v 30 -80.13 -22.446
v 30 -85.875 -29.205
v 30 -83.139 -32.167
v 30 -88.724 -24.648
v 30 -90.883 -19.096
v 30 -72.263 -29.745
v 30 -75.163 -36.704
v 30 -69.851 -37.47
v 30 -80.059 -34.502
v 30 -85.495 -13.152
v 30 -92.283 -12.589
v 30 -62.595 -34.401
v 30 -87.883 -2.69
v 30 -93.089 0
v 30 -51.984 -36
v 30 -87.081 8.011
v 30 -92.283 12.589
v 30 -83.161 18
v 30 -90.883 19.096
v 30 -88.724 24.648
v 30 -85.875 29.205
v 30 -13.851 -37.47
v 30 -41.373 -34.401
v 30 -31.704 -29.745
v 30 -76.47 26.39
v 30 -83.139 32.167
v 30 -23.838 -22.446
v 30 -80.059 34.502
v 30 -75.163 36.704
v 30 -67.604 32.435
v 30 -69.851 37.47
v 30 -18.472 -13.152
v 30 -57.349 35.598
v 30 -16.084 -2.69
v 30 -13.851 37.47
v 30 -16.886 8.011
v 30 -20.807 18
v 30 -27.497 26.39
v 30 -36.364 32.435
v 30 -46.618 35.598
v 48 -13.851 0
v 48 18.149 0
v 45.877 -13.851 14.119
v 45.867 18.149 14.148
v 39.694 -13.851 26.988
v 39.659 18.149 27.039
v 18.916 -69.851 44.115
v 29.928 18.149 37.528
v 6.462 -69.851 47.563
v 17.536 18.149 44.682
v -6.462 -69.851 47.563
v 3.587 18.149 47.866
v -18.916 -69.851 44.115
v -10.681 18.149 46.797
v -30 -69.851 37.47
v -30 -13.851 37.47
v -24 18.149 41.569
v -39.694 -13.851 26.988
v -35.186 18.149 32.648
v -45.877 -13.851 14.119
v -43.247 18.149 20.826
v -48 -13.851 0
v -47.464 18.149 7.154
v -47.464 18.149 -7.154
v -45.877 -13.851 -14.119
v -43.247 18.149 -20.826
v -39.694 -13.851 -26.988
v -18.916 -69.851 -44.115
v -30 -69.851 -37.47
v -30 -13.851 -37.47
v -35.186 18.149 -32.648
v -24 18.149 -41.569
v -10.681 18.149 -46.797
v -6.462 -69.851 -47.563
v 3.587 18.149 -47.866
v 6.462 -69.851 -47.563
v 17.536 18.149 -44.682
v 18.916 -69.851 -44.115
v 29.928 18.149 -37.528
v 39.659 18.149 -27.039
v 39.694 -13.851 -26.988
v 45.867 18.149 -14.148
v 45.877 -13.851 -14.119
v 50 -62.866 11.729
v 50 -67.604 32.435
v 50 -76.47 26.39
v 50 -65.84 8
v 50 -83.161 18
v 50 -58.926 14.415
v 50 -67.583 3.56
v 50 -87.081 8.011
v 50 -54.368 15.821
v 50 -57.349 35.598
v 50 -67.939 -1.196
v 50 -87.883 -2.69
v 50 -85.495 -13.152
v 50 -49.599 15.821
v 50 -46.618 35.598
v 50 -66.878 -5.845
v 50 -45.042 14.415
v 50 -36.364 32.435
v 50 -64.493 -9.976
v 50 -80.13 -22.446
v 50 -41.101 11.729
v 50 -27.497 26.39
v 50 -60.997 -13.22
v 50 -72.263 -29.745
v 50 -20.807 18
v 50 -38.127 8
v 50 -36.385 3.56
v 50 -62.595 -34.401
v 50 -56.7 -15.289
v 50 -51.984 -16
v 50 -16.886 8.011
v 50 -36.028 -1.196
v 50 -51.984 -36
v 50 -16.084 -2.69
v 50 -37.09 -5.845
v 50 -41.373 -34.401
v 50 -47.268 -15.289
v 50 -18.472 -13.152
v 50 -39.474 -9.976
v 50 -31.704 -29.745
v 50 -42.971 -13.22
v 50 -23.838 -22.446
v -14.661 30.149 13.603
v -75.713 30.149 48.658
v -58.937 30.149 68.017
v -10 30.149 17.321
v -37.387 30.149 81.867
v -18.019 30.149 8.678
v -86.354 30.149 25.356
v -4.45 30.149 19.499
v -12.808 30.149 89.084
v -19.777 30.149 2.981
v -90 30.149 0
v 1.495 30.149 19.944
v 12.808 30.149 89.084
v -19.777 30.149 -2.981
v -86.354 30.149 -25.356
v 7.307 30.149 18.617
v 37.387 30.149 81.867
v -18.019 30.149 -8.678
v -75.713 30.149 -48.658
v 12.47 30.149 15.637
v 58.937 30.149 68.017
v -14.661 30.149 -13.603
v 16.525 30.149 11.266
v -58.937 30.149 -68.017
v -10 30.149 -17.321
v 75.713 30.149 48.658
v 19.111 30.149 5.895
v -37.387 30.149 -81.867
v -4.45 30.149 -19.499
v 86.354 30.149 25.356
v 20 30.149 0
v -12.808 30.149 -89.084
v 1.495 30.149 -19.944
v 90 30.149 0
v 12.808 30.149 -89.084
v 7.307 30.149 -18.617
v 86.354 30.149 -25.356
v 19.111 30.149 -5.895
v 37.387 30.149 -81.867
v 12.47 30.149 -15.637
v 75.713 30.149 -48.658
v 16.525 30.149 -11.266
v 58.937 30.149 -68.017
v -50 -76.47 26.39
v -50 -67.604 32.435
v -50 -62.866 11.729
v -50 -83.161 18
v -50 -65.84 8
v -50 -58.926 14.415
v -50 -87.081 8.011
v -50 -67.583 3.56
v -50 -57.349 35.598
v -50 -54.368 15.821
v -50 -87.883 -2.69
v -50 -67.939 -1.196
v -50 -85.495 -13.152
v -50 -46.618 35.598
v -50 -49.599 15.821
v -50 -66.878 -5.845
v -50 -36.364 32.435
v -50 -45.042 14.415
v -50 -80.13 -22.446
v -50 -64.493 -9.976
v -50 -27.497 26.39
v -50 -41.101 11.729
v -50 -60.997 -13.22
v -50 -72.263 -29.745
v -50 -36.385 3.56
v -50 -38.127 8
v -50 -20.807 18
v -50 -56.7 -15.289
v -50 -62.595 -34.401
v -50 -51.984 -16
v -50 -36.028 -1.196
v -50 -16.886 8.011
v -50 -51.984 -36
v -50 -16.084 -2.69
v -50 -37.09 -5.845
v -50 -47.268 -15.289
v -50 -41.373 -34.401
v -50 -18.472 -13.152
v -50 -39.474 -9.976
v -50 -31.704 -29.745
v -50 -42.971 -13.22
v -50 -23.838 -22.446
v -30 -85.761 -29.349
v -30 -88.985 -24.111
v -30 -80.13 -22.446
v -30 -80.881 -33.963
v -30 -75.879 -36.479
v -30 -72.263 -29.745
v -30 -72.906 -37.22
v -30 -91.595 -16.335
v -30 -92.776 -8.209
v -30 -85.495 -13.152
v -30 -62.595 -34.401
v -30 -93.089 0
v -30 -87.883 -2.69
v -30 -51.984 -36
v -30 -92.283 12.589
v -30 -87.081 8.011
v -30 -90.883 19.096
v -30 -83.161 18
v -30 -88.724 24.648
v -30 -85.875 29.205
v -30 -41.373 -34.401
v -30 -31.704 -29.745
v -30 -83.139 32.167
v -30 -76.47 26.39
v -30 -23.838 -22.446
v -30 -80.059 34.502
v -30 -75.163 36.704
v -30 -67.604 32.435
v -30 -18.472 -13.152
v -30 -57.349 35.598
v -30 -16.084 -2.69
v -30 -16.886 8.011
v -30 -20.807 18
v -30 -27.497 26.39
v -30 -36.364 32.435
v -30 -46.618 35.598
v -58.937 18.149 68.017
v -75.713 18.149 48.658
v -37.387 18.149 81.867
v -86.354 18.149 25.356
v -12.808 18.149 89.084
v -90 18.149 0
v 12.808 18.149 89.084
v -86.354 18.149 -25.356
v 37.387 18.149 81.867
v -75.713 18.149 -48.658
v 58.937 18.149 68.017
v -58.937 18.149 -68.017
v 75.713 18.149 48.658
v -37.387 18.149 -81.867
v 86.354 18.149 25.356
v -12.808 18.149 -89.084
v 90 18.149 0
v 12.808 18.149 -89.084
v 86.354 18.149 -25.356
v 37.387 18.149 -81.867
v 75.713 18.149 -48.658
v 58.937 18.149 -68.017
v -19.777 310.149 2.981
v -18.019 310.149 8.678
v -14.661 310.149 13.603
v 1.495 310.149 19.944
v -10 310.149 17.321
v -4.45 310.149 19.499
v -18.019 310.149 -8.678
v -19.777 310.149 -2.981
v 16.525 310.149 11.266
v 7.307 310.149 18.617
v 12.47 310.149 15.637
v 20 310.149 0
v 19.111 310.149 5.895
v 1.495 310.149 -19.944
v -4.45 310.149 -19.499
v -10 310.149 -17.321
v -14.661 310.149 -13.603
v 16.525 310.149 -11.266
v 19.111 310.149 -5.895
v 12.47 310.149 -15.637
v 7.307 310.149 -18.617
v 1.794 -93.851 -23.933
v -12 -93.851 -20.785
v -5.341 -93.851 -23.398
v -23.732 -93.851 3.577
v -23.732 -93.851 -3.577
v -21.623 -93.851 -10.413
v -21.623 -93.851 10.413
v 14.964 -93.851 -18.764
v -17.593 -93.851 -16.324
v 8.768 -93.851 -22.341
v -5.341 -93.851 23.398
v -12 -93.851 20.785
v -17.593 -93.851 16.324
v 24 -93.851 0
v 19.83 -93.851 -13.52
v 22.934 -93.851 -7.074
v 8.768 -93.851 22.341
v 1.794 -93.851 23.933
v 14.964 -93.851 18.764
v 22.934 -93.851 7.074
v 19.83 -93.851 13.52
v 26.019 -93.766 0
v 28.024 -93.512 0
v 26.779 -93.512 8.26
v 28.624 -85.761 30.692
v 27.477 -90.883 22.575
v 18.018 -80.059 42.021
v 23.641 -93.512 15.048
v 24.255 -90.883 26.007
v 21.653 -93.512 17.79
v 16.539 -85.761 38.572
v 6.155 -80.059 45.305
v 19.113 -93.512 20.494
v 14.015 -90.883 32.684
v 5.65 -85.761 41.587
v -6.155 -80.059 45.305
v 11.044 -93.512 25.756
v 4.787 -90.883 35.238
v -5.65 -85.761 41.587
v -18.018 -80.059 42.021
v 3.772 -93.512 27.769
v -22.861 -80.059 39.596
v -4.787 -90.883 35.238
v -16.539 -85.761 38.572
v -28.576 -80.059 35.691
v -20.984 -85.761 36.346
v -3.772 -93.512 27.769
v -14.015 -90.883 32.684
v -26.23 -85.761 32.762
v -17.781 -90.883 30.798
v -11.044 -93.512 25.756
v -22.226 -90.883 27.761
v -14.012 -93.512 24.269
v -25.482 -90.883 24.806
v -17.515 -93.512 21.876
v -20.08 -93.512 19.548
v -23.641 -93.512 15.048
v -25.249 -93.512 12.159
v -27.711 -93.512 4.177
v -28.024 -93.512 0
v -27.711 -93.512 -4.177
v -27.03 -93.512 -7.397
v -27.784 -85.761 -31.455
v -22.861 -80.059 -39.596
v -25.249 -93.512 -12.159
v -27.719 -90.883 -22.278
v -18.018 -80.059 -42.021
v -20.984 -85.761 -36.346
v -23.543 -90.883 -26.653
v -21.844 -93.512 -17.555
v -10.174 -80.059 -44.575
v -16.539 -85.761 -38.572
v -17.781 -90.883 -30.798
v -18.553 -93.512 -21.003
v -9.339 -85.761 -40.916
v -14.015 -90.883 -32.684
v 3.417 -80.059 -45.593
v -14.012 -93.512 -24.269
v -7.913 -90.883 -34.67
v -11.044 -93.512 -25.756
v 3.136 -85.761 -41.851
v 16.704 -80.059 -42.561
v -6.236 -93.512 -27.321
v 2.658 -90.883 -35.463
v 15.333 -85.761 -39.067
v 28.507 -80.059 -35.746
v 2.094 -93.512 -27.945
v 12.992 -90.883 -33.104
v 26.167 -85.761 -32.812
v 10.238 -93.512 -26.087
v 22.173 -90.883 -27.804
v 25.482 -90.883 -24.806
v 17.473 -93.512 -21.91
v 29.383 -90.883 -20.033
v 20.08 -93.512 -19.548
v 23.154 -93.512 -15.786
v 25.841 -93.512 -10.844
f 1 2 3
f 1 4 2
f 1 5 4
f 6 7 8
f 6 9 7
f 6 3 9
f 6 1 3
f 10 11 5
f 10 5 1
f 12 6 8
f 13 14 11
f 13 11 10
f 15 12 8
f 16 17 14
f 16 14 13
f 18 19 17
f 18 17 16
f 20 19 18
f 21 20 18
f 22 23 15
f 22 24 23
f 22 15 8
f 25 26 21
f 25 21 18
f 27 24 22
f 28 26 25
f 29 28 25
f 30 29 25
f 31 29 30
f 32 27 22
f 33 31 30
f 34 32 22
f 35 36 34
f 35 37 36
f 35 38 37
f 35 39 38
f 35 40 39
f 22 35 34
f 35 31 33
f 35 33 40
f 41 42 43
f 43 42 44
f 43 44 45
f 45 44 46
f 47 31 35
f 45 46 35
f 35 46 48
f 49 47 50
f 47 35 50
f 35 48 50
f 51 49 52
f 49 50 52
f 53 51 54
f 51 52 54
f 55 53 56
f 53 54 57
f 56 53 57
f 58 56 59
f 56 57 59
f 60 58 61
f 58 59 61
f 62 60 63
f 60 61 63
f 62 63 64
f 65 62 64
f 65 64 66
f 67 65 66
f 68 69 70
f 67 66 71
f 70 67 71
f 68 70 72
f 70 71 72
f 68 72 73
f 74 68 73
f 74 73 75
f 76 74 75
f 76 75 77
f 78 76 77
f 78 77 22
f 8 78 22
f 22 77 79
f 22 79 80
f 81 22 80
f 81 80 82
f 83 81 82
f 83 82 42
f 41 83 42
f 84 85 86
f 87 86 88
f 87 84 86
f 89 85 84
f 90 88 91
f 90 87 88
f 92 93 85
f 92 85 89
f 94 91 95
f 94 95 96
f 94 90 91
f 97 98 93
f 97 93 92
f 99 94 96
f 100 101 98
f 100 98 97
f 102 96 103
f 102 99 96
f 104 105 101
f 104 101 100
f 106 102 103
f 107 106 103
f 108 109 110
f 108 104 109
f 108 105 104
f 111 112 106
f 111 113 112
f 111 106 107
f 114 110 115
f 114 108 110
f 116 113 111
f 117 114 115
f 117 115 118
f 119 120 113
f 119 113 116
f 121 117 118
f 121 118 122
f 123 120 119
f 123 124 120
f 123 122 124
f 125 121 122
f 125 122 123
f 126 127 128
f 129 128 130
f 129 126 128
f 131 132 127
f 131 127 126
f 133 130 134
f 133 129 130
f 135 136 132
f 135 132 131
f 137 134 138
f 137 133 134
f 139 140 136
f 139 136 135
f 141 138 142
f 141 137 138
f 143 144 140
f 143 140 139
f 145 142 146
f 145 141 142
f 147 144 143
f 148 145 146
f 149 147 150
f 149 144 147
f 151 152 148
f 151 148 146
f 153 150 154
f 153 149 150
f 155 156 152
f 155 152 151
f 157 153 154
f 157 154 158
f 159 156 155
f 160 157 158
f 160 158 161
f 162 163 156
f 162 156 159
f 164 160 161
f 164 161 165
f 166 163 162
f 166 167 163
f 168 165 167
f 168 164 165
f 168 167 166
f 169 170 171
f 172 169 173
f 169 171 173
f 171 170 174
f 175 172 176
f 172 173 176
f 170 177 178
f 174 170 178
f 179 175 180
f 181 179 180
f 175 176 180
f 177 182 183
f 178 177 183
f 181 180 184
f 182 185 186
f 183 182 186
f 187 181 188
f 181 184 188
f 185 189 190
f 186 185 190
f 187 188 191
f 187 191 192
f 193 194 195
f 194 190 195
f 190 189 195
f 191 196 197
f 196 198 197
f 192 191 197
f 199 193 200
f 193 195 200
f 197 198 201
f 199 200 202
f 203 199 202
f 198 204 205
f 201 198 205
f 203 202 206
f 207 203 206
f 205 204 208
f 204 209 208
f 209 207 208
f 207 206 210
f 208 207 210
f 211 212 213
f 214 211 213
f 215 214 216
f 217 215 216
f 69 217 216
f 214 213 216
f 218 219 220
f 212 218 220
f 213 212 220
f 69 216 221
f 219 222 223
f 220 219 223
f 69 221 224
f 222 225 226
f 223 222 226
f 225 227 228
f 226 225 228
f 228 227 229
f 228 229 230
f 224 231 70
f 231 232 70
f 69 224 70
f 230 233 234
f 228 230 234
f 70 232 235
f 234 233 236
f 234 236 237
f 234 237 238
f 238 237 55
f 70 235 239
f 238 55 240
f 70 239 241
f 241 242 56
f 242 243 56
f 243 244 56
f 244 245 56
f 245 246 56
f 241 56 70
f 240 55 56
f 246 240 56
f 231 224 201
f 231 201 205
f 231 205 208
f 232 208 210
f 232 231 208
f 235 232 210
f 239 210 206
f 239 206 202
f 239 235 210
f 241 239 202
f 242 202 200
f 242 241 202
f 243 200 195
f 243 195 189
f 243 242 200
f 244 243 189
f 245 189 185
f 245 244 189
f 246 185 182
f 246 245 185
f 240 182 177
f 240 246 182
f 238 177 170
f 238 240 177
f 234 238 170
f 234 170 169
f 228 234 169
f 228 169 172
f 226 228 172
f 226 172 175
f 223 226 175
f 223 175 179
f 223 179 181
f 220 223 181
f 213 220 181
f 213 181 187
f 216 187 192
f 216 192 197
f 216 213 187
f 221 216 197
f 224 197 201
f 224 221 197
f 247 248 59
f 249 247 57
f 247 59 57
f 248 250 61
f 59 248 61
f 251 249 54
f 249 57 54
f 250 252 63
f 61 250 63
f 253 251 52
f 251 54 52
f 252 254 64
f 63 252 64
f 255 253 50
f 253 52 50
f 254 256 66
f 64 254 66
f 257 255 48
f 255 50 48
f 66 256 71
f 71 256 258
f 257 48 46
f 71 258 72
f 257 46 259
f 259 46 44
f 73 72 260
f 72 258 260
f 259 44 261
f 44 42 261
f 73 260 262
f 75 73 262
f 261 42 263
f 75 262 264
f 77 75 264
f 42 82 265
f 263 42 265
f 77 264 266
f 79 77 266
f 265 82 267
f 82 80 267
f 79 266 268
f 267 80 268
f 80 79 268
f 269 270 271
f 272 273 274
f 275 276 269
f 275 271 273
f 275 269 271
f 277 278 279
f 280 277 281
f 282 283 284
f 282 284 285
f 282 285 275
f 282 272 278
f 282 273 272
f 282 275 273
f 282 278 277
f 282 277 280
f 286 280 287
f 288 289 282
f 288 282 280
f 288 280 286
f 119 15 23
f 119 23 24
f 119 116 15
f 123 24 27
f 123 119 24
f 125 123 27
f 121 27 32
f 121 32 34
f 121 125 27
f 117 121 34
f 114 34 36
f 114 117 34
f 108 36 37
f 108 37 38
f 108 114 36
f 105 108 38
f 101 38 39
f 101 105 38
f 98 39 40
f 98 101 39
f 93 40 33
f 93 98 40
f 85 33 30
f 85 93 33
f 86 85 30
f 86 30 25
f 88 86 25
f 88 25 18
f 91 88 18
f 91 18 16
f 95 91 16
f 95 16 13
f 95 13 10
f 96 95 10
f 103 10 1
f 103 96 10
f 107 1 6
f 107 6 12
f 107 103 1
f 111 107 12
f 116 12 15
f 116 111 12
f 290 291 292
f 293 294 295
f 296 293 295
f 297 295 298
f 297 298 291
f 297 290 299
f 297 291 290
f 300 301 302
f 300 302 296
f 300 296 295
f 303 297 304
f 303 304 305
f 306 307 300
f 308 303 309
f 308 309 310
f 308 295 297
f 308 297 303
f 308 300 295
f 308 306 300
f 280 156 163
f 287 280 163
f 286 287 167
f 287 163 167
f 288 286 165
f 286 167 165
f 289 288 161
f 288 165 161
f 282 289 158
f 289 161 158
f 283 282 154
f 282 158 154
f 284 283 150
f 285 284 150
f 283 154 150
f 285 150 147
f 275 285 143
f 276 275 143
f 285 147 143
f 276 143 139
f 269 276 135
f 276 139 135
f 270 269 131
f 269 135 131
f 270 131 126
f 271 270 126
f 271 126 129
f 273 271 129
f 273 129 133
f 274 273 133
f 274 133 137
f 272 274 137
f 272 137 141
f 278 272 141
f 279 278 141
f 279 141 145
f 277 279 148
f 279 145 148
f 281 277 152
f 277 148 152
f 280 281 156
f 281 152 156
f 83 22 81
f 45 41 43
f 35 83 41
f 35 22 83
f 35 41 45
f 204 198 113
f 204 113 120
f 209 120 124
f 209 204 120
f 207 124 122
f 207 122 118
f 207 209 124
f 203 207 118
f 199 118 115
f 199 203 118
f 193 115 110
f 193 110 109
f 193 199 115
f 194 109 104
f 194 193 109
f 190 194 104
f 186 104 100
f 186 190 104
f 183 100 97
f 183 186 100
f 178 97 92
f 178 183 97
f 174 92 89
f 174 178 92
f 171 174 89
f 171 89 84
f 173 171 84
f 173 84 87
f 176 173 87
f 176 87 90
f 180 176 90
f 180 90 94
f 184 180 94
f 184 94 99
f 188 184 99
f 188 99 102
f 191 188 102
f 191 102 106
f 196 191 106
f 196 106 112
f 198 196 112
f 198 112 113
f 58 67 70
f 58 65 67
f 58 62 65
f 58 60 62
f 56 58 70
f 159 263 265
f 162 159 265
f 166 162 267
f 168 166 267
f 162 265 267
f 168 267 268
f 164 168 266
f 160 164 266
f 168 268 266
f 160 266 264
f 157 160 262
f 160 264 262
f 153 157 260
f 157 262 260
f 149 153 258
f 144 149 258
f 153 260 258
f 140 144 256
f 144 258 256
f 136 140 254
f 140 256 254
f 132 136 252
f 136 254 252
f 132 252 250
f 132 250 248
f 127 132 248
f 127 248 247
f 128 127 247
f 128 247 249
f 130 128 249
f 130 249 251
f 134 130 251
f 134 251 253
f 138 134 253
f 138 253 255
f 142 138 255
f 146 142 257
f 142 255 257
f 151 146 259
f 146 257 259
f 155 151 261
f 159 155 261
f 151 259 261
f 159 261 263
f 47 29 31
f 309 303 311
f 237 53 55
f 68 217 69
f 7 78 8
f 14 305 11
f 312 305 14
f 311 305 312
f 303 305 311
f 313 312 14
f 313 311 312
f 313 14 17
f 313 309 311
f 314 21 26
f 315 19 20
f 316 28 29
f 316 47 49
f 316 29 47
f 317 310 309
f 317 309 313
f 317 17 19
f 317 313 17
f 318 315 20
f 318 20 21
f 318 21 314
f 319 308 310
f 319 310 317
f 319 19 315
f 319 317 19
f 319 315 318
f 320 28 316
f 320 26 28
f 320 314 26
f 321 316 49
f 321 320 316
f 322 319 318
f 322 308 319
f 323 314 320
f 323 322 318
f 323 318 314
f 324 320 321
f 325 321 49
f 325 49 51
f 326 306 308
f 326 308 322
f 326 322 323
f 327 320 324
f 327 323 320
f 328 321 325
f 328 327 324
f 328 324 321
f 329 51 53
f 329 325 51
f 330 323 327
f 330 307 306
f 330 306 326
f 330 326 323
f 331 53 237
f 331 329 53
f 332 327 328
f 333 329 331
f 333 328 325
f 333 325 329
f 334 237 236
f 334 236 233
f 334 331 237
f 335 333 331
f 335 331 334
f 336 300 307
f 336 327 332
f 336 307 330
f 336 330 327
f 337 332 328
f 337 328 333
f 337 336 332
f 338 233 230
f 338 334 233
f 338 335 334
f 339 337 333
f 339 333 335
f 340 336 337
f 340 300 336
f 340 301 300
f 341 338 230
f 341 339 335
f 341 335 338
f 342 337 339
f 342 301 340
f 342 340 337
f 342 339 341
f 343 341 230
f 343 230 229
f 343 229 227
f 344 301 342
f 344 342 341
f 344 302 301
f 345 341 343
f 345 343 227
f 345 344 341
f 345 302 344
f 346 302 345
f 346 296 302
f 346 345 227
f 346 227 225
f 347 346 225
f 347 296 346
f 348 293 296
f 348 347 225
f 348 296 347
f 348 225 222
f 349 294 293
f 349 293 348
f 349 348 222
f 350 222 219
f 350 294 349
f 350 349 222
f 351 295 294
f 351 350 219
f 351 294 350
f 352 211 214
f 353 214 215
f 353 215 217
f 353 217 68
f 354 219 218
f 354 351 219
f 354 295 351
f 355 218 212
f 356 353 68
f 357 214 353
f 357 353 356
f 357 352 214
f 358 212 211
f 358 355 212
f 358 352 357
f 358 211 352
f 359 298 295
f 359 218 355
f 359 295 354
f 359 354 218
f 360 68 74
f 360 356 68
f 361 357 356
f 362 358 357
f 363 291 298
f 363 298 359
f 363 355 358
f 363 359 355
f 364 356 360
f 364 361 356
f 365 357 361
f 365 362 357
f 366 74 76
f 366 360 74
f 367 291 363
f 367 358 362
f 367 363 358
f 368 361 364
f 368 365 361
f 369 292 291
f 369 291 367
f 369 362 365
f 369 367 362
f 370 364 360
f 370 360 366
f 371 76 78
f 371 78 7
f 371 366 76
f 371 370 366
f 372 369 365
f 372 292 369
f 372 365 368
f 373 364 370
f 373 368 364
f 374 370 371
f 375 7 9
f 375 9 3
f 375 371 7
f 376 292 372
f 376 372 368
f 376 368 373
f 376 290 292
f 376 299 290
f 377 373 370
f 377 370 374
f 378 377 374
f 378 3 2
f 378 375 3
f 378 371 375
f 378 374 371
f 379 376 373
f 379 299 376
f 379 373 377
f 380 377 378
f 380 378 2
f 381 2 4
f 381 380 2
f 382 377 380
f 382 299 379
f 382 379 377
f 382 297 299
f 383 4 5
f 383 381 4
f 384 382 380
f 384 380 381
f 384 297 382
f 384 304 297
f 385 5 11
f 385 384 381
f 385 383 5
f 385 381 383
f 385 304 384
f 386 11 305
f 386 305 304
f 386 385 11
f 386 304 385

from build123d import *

# Parameters (mm, degrees)
SKETCH1_R               = 225
BOSS_EXTRUDE1_DEPTH     = 30
SKETCH2_R               = 50
BOSS_EXTRUDE2_DEPTH     = 700
SKETCH3_R               = 120
BOSS_EXTRUDE3_DEPTH     = 280
FILLET1_R               = 60
SKETCH4_W               = 195.7
SKETCH4_H               = 200
CUT_EXTRUDE1_DEPTH      = 226
CUT_EXTRUDE1_DEPTH_BACK = 226
SKETCH5_R               = 40
CUT_EXTRUDE2_DEPTH      = 301
SKETCH6_R               = 90
SKETCH6_R_2             = 40
BOSS_EXTRUDE4_DEPTH     = 125
SCALE1_SCALE            = 0.4


with BuildPart() as part:
    # Sketch1 → Boss-Extrude1 (new body)
    with BuildSketch(Plane(origin=(0, 0, 0), x_dir=(1, 0, 0), z_dir=(0, 1, 0))):
        Circle(SKETCH1_R)
    extrude(amount=BOSS_EXTRUDE1_DEPTH)

    # Sketch2 → Boss-Extrude2 (add)
    with BuildSketch(Plane(origin=(0, 30, 0), x_dir=(1, 0, 0), z_dir=(0, 1, 0))):
        Circle(SKETCH2_R)
    extrude(amount=BOSS_EXTRUDE2_DEPTH)

    # Sketch3 → Boss-Extrude3 (add)
    with BuildSketch(Plane.XZ):
        Circle(SKETCH3_R)
    extrude(amount=BOSS_EXTRUDE3_DEPTH)

    # Fillet1
    fillet1_edges = [part.edges().sort_by_distance(p)[0] for p in [
        (-120, -280, 0),
    ]]
    fillet(fillet1_edges, radius=FILLET1_R)

    # Sketch4 → Cut-Extrude1 (cut, two sides)
    with BuildSketch(Plane.XY) as cut_extrude1_sk:
        with Locations((172.85, -180)):
            Rectangle(SKETCH4_W, SKETCH4_H)
        with Locations((-172.85, -180)):
            Rectangle(SKETCH4_W, SKETCH4_H)
    extrude(amount=CUT_EXTRUDE1_DEPTH, mode=Mode.SUBTRACT)
    extrude(cut_extrude1_sk.sketch, amount=-CUT_EXTRUDE1_DEPTH_BACK, mode=Mode.SUBTRACT)

    # Sketch5 → Cut-Extrude2 (cut, through all)
    with BuildSketch(Plane(origin=(75, 0, 0), x_dir=(0, 0, -1), z_dir=(1, 0, 0))):
        with Locations((0, -175.331172544)):
            Circle(SKETCH5_R)
    extrude(amount=-CUT_EXTRUDE2_DEPTH, mode=Mode.SUBTRACT)

    # Sketch6 → Boss-Extrude4 (add, symmetric)
    with BuildSketch(Plane(origin=(0, 0, 0), x_dir=(0, 0, -1), z_dir=(1, 0, 0))):
        with Locations((0, -175.331172544)):
            Circle(SKETCH6_R)
        with Locations((0, -175.331172544)):
            Circle(SKETCH6_R_2, mode=Mode.SUBTRACT)
    extrude(amount=BOSS_EXTRUDE4_DEPTH, both=True)


with BuildPart() as part_1:
    # Scale1: scaled about (-3.146e-06, 30.247926965, -1.0493e-05)
    add(part.part.scale(SCALE1_SCALE).moved(Location((-1.888e-06, 18.148756179, -6.296e-06))))


solid = part_1.part
